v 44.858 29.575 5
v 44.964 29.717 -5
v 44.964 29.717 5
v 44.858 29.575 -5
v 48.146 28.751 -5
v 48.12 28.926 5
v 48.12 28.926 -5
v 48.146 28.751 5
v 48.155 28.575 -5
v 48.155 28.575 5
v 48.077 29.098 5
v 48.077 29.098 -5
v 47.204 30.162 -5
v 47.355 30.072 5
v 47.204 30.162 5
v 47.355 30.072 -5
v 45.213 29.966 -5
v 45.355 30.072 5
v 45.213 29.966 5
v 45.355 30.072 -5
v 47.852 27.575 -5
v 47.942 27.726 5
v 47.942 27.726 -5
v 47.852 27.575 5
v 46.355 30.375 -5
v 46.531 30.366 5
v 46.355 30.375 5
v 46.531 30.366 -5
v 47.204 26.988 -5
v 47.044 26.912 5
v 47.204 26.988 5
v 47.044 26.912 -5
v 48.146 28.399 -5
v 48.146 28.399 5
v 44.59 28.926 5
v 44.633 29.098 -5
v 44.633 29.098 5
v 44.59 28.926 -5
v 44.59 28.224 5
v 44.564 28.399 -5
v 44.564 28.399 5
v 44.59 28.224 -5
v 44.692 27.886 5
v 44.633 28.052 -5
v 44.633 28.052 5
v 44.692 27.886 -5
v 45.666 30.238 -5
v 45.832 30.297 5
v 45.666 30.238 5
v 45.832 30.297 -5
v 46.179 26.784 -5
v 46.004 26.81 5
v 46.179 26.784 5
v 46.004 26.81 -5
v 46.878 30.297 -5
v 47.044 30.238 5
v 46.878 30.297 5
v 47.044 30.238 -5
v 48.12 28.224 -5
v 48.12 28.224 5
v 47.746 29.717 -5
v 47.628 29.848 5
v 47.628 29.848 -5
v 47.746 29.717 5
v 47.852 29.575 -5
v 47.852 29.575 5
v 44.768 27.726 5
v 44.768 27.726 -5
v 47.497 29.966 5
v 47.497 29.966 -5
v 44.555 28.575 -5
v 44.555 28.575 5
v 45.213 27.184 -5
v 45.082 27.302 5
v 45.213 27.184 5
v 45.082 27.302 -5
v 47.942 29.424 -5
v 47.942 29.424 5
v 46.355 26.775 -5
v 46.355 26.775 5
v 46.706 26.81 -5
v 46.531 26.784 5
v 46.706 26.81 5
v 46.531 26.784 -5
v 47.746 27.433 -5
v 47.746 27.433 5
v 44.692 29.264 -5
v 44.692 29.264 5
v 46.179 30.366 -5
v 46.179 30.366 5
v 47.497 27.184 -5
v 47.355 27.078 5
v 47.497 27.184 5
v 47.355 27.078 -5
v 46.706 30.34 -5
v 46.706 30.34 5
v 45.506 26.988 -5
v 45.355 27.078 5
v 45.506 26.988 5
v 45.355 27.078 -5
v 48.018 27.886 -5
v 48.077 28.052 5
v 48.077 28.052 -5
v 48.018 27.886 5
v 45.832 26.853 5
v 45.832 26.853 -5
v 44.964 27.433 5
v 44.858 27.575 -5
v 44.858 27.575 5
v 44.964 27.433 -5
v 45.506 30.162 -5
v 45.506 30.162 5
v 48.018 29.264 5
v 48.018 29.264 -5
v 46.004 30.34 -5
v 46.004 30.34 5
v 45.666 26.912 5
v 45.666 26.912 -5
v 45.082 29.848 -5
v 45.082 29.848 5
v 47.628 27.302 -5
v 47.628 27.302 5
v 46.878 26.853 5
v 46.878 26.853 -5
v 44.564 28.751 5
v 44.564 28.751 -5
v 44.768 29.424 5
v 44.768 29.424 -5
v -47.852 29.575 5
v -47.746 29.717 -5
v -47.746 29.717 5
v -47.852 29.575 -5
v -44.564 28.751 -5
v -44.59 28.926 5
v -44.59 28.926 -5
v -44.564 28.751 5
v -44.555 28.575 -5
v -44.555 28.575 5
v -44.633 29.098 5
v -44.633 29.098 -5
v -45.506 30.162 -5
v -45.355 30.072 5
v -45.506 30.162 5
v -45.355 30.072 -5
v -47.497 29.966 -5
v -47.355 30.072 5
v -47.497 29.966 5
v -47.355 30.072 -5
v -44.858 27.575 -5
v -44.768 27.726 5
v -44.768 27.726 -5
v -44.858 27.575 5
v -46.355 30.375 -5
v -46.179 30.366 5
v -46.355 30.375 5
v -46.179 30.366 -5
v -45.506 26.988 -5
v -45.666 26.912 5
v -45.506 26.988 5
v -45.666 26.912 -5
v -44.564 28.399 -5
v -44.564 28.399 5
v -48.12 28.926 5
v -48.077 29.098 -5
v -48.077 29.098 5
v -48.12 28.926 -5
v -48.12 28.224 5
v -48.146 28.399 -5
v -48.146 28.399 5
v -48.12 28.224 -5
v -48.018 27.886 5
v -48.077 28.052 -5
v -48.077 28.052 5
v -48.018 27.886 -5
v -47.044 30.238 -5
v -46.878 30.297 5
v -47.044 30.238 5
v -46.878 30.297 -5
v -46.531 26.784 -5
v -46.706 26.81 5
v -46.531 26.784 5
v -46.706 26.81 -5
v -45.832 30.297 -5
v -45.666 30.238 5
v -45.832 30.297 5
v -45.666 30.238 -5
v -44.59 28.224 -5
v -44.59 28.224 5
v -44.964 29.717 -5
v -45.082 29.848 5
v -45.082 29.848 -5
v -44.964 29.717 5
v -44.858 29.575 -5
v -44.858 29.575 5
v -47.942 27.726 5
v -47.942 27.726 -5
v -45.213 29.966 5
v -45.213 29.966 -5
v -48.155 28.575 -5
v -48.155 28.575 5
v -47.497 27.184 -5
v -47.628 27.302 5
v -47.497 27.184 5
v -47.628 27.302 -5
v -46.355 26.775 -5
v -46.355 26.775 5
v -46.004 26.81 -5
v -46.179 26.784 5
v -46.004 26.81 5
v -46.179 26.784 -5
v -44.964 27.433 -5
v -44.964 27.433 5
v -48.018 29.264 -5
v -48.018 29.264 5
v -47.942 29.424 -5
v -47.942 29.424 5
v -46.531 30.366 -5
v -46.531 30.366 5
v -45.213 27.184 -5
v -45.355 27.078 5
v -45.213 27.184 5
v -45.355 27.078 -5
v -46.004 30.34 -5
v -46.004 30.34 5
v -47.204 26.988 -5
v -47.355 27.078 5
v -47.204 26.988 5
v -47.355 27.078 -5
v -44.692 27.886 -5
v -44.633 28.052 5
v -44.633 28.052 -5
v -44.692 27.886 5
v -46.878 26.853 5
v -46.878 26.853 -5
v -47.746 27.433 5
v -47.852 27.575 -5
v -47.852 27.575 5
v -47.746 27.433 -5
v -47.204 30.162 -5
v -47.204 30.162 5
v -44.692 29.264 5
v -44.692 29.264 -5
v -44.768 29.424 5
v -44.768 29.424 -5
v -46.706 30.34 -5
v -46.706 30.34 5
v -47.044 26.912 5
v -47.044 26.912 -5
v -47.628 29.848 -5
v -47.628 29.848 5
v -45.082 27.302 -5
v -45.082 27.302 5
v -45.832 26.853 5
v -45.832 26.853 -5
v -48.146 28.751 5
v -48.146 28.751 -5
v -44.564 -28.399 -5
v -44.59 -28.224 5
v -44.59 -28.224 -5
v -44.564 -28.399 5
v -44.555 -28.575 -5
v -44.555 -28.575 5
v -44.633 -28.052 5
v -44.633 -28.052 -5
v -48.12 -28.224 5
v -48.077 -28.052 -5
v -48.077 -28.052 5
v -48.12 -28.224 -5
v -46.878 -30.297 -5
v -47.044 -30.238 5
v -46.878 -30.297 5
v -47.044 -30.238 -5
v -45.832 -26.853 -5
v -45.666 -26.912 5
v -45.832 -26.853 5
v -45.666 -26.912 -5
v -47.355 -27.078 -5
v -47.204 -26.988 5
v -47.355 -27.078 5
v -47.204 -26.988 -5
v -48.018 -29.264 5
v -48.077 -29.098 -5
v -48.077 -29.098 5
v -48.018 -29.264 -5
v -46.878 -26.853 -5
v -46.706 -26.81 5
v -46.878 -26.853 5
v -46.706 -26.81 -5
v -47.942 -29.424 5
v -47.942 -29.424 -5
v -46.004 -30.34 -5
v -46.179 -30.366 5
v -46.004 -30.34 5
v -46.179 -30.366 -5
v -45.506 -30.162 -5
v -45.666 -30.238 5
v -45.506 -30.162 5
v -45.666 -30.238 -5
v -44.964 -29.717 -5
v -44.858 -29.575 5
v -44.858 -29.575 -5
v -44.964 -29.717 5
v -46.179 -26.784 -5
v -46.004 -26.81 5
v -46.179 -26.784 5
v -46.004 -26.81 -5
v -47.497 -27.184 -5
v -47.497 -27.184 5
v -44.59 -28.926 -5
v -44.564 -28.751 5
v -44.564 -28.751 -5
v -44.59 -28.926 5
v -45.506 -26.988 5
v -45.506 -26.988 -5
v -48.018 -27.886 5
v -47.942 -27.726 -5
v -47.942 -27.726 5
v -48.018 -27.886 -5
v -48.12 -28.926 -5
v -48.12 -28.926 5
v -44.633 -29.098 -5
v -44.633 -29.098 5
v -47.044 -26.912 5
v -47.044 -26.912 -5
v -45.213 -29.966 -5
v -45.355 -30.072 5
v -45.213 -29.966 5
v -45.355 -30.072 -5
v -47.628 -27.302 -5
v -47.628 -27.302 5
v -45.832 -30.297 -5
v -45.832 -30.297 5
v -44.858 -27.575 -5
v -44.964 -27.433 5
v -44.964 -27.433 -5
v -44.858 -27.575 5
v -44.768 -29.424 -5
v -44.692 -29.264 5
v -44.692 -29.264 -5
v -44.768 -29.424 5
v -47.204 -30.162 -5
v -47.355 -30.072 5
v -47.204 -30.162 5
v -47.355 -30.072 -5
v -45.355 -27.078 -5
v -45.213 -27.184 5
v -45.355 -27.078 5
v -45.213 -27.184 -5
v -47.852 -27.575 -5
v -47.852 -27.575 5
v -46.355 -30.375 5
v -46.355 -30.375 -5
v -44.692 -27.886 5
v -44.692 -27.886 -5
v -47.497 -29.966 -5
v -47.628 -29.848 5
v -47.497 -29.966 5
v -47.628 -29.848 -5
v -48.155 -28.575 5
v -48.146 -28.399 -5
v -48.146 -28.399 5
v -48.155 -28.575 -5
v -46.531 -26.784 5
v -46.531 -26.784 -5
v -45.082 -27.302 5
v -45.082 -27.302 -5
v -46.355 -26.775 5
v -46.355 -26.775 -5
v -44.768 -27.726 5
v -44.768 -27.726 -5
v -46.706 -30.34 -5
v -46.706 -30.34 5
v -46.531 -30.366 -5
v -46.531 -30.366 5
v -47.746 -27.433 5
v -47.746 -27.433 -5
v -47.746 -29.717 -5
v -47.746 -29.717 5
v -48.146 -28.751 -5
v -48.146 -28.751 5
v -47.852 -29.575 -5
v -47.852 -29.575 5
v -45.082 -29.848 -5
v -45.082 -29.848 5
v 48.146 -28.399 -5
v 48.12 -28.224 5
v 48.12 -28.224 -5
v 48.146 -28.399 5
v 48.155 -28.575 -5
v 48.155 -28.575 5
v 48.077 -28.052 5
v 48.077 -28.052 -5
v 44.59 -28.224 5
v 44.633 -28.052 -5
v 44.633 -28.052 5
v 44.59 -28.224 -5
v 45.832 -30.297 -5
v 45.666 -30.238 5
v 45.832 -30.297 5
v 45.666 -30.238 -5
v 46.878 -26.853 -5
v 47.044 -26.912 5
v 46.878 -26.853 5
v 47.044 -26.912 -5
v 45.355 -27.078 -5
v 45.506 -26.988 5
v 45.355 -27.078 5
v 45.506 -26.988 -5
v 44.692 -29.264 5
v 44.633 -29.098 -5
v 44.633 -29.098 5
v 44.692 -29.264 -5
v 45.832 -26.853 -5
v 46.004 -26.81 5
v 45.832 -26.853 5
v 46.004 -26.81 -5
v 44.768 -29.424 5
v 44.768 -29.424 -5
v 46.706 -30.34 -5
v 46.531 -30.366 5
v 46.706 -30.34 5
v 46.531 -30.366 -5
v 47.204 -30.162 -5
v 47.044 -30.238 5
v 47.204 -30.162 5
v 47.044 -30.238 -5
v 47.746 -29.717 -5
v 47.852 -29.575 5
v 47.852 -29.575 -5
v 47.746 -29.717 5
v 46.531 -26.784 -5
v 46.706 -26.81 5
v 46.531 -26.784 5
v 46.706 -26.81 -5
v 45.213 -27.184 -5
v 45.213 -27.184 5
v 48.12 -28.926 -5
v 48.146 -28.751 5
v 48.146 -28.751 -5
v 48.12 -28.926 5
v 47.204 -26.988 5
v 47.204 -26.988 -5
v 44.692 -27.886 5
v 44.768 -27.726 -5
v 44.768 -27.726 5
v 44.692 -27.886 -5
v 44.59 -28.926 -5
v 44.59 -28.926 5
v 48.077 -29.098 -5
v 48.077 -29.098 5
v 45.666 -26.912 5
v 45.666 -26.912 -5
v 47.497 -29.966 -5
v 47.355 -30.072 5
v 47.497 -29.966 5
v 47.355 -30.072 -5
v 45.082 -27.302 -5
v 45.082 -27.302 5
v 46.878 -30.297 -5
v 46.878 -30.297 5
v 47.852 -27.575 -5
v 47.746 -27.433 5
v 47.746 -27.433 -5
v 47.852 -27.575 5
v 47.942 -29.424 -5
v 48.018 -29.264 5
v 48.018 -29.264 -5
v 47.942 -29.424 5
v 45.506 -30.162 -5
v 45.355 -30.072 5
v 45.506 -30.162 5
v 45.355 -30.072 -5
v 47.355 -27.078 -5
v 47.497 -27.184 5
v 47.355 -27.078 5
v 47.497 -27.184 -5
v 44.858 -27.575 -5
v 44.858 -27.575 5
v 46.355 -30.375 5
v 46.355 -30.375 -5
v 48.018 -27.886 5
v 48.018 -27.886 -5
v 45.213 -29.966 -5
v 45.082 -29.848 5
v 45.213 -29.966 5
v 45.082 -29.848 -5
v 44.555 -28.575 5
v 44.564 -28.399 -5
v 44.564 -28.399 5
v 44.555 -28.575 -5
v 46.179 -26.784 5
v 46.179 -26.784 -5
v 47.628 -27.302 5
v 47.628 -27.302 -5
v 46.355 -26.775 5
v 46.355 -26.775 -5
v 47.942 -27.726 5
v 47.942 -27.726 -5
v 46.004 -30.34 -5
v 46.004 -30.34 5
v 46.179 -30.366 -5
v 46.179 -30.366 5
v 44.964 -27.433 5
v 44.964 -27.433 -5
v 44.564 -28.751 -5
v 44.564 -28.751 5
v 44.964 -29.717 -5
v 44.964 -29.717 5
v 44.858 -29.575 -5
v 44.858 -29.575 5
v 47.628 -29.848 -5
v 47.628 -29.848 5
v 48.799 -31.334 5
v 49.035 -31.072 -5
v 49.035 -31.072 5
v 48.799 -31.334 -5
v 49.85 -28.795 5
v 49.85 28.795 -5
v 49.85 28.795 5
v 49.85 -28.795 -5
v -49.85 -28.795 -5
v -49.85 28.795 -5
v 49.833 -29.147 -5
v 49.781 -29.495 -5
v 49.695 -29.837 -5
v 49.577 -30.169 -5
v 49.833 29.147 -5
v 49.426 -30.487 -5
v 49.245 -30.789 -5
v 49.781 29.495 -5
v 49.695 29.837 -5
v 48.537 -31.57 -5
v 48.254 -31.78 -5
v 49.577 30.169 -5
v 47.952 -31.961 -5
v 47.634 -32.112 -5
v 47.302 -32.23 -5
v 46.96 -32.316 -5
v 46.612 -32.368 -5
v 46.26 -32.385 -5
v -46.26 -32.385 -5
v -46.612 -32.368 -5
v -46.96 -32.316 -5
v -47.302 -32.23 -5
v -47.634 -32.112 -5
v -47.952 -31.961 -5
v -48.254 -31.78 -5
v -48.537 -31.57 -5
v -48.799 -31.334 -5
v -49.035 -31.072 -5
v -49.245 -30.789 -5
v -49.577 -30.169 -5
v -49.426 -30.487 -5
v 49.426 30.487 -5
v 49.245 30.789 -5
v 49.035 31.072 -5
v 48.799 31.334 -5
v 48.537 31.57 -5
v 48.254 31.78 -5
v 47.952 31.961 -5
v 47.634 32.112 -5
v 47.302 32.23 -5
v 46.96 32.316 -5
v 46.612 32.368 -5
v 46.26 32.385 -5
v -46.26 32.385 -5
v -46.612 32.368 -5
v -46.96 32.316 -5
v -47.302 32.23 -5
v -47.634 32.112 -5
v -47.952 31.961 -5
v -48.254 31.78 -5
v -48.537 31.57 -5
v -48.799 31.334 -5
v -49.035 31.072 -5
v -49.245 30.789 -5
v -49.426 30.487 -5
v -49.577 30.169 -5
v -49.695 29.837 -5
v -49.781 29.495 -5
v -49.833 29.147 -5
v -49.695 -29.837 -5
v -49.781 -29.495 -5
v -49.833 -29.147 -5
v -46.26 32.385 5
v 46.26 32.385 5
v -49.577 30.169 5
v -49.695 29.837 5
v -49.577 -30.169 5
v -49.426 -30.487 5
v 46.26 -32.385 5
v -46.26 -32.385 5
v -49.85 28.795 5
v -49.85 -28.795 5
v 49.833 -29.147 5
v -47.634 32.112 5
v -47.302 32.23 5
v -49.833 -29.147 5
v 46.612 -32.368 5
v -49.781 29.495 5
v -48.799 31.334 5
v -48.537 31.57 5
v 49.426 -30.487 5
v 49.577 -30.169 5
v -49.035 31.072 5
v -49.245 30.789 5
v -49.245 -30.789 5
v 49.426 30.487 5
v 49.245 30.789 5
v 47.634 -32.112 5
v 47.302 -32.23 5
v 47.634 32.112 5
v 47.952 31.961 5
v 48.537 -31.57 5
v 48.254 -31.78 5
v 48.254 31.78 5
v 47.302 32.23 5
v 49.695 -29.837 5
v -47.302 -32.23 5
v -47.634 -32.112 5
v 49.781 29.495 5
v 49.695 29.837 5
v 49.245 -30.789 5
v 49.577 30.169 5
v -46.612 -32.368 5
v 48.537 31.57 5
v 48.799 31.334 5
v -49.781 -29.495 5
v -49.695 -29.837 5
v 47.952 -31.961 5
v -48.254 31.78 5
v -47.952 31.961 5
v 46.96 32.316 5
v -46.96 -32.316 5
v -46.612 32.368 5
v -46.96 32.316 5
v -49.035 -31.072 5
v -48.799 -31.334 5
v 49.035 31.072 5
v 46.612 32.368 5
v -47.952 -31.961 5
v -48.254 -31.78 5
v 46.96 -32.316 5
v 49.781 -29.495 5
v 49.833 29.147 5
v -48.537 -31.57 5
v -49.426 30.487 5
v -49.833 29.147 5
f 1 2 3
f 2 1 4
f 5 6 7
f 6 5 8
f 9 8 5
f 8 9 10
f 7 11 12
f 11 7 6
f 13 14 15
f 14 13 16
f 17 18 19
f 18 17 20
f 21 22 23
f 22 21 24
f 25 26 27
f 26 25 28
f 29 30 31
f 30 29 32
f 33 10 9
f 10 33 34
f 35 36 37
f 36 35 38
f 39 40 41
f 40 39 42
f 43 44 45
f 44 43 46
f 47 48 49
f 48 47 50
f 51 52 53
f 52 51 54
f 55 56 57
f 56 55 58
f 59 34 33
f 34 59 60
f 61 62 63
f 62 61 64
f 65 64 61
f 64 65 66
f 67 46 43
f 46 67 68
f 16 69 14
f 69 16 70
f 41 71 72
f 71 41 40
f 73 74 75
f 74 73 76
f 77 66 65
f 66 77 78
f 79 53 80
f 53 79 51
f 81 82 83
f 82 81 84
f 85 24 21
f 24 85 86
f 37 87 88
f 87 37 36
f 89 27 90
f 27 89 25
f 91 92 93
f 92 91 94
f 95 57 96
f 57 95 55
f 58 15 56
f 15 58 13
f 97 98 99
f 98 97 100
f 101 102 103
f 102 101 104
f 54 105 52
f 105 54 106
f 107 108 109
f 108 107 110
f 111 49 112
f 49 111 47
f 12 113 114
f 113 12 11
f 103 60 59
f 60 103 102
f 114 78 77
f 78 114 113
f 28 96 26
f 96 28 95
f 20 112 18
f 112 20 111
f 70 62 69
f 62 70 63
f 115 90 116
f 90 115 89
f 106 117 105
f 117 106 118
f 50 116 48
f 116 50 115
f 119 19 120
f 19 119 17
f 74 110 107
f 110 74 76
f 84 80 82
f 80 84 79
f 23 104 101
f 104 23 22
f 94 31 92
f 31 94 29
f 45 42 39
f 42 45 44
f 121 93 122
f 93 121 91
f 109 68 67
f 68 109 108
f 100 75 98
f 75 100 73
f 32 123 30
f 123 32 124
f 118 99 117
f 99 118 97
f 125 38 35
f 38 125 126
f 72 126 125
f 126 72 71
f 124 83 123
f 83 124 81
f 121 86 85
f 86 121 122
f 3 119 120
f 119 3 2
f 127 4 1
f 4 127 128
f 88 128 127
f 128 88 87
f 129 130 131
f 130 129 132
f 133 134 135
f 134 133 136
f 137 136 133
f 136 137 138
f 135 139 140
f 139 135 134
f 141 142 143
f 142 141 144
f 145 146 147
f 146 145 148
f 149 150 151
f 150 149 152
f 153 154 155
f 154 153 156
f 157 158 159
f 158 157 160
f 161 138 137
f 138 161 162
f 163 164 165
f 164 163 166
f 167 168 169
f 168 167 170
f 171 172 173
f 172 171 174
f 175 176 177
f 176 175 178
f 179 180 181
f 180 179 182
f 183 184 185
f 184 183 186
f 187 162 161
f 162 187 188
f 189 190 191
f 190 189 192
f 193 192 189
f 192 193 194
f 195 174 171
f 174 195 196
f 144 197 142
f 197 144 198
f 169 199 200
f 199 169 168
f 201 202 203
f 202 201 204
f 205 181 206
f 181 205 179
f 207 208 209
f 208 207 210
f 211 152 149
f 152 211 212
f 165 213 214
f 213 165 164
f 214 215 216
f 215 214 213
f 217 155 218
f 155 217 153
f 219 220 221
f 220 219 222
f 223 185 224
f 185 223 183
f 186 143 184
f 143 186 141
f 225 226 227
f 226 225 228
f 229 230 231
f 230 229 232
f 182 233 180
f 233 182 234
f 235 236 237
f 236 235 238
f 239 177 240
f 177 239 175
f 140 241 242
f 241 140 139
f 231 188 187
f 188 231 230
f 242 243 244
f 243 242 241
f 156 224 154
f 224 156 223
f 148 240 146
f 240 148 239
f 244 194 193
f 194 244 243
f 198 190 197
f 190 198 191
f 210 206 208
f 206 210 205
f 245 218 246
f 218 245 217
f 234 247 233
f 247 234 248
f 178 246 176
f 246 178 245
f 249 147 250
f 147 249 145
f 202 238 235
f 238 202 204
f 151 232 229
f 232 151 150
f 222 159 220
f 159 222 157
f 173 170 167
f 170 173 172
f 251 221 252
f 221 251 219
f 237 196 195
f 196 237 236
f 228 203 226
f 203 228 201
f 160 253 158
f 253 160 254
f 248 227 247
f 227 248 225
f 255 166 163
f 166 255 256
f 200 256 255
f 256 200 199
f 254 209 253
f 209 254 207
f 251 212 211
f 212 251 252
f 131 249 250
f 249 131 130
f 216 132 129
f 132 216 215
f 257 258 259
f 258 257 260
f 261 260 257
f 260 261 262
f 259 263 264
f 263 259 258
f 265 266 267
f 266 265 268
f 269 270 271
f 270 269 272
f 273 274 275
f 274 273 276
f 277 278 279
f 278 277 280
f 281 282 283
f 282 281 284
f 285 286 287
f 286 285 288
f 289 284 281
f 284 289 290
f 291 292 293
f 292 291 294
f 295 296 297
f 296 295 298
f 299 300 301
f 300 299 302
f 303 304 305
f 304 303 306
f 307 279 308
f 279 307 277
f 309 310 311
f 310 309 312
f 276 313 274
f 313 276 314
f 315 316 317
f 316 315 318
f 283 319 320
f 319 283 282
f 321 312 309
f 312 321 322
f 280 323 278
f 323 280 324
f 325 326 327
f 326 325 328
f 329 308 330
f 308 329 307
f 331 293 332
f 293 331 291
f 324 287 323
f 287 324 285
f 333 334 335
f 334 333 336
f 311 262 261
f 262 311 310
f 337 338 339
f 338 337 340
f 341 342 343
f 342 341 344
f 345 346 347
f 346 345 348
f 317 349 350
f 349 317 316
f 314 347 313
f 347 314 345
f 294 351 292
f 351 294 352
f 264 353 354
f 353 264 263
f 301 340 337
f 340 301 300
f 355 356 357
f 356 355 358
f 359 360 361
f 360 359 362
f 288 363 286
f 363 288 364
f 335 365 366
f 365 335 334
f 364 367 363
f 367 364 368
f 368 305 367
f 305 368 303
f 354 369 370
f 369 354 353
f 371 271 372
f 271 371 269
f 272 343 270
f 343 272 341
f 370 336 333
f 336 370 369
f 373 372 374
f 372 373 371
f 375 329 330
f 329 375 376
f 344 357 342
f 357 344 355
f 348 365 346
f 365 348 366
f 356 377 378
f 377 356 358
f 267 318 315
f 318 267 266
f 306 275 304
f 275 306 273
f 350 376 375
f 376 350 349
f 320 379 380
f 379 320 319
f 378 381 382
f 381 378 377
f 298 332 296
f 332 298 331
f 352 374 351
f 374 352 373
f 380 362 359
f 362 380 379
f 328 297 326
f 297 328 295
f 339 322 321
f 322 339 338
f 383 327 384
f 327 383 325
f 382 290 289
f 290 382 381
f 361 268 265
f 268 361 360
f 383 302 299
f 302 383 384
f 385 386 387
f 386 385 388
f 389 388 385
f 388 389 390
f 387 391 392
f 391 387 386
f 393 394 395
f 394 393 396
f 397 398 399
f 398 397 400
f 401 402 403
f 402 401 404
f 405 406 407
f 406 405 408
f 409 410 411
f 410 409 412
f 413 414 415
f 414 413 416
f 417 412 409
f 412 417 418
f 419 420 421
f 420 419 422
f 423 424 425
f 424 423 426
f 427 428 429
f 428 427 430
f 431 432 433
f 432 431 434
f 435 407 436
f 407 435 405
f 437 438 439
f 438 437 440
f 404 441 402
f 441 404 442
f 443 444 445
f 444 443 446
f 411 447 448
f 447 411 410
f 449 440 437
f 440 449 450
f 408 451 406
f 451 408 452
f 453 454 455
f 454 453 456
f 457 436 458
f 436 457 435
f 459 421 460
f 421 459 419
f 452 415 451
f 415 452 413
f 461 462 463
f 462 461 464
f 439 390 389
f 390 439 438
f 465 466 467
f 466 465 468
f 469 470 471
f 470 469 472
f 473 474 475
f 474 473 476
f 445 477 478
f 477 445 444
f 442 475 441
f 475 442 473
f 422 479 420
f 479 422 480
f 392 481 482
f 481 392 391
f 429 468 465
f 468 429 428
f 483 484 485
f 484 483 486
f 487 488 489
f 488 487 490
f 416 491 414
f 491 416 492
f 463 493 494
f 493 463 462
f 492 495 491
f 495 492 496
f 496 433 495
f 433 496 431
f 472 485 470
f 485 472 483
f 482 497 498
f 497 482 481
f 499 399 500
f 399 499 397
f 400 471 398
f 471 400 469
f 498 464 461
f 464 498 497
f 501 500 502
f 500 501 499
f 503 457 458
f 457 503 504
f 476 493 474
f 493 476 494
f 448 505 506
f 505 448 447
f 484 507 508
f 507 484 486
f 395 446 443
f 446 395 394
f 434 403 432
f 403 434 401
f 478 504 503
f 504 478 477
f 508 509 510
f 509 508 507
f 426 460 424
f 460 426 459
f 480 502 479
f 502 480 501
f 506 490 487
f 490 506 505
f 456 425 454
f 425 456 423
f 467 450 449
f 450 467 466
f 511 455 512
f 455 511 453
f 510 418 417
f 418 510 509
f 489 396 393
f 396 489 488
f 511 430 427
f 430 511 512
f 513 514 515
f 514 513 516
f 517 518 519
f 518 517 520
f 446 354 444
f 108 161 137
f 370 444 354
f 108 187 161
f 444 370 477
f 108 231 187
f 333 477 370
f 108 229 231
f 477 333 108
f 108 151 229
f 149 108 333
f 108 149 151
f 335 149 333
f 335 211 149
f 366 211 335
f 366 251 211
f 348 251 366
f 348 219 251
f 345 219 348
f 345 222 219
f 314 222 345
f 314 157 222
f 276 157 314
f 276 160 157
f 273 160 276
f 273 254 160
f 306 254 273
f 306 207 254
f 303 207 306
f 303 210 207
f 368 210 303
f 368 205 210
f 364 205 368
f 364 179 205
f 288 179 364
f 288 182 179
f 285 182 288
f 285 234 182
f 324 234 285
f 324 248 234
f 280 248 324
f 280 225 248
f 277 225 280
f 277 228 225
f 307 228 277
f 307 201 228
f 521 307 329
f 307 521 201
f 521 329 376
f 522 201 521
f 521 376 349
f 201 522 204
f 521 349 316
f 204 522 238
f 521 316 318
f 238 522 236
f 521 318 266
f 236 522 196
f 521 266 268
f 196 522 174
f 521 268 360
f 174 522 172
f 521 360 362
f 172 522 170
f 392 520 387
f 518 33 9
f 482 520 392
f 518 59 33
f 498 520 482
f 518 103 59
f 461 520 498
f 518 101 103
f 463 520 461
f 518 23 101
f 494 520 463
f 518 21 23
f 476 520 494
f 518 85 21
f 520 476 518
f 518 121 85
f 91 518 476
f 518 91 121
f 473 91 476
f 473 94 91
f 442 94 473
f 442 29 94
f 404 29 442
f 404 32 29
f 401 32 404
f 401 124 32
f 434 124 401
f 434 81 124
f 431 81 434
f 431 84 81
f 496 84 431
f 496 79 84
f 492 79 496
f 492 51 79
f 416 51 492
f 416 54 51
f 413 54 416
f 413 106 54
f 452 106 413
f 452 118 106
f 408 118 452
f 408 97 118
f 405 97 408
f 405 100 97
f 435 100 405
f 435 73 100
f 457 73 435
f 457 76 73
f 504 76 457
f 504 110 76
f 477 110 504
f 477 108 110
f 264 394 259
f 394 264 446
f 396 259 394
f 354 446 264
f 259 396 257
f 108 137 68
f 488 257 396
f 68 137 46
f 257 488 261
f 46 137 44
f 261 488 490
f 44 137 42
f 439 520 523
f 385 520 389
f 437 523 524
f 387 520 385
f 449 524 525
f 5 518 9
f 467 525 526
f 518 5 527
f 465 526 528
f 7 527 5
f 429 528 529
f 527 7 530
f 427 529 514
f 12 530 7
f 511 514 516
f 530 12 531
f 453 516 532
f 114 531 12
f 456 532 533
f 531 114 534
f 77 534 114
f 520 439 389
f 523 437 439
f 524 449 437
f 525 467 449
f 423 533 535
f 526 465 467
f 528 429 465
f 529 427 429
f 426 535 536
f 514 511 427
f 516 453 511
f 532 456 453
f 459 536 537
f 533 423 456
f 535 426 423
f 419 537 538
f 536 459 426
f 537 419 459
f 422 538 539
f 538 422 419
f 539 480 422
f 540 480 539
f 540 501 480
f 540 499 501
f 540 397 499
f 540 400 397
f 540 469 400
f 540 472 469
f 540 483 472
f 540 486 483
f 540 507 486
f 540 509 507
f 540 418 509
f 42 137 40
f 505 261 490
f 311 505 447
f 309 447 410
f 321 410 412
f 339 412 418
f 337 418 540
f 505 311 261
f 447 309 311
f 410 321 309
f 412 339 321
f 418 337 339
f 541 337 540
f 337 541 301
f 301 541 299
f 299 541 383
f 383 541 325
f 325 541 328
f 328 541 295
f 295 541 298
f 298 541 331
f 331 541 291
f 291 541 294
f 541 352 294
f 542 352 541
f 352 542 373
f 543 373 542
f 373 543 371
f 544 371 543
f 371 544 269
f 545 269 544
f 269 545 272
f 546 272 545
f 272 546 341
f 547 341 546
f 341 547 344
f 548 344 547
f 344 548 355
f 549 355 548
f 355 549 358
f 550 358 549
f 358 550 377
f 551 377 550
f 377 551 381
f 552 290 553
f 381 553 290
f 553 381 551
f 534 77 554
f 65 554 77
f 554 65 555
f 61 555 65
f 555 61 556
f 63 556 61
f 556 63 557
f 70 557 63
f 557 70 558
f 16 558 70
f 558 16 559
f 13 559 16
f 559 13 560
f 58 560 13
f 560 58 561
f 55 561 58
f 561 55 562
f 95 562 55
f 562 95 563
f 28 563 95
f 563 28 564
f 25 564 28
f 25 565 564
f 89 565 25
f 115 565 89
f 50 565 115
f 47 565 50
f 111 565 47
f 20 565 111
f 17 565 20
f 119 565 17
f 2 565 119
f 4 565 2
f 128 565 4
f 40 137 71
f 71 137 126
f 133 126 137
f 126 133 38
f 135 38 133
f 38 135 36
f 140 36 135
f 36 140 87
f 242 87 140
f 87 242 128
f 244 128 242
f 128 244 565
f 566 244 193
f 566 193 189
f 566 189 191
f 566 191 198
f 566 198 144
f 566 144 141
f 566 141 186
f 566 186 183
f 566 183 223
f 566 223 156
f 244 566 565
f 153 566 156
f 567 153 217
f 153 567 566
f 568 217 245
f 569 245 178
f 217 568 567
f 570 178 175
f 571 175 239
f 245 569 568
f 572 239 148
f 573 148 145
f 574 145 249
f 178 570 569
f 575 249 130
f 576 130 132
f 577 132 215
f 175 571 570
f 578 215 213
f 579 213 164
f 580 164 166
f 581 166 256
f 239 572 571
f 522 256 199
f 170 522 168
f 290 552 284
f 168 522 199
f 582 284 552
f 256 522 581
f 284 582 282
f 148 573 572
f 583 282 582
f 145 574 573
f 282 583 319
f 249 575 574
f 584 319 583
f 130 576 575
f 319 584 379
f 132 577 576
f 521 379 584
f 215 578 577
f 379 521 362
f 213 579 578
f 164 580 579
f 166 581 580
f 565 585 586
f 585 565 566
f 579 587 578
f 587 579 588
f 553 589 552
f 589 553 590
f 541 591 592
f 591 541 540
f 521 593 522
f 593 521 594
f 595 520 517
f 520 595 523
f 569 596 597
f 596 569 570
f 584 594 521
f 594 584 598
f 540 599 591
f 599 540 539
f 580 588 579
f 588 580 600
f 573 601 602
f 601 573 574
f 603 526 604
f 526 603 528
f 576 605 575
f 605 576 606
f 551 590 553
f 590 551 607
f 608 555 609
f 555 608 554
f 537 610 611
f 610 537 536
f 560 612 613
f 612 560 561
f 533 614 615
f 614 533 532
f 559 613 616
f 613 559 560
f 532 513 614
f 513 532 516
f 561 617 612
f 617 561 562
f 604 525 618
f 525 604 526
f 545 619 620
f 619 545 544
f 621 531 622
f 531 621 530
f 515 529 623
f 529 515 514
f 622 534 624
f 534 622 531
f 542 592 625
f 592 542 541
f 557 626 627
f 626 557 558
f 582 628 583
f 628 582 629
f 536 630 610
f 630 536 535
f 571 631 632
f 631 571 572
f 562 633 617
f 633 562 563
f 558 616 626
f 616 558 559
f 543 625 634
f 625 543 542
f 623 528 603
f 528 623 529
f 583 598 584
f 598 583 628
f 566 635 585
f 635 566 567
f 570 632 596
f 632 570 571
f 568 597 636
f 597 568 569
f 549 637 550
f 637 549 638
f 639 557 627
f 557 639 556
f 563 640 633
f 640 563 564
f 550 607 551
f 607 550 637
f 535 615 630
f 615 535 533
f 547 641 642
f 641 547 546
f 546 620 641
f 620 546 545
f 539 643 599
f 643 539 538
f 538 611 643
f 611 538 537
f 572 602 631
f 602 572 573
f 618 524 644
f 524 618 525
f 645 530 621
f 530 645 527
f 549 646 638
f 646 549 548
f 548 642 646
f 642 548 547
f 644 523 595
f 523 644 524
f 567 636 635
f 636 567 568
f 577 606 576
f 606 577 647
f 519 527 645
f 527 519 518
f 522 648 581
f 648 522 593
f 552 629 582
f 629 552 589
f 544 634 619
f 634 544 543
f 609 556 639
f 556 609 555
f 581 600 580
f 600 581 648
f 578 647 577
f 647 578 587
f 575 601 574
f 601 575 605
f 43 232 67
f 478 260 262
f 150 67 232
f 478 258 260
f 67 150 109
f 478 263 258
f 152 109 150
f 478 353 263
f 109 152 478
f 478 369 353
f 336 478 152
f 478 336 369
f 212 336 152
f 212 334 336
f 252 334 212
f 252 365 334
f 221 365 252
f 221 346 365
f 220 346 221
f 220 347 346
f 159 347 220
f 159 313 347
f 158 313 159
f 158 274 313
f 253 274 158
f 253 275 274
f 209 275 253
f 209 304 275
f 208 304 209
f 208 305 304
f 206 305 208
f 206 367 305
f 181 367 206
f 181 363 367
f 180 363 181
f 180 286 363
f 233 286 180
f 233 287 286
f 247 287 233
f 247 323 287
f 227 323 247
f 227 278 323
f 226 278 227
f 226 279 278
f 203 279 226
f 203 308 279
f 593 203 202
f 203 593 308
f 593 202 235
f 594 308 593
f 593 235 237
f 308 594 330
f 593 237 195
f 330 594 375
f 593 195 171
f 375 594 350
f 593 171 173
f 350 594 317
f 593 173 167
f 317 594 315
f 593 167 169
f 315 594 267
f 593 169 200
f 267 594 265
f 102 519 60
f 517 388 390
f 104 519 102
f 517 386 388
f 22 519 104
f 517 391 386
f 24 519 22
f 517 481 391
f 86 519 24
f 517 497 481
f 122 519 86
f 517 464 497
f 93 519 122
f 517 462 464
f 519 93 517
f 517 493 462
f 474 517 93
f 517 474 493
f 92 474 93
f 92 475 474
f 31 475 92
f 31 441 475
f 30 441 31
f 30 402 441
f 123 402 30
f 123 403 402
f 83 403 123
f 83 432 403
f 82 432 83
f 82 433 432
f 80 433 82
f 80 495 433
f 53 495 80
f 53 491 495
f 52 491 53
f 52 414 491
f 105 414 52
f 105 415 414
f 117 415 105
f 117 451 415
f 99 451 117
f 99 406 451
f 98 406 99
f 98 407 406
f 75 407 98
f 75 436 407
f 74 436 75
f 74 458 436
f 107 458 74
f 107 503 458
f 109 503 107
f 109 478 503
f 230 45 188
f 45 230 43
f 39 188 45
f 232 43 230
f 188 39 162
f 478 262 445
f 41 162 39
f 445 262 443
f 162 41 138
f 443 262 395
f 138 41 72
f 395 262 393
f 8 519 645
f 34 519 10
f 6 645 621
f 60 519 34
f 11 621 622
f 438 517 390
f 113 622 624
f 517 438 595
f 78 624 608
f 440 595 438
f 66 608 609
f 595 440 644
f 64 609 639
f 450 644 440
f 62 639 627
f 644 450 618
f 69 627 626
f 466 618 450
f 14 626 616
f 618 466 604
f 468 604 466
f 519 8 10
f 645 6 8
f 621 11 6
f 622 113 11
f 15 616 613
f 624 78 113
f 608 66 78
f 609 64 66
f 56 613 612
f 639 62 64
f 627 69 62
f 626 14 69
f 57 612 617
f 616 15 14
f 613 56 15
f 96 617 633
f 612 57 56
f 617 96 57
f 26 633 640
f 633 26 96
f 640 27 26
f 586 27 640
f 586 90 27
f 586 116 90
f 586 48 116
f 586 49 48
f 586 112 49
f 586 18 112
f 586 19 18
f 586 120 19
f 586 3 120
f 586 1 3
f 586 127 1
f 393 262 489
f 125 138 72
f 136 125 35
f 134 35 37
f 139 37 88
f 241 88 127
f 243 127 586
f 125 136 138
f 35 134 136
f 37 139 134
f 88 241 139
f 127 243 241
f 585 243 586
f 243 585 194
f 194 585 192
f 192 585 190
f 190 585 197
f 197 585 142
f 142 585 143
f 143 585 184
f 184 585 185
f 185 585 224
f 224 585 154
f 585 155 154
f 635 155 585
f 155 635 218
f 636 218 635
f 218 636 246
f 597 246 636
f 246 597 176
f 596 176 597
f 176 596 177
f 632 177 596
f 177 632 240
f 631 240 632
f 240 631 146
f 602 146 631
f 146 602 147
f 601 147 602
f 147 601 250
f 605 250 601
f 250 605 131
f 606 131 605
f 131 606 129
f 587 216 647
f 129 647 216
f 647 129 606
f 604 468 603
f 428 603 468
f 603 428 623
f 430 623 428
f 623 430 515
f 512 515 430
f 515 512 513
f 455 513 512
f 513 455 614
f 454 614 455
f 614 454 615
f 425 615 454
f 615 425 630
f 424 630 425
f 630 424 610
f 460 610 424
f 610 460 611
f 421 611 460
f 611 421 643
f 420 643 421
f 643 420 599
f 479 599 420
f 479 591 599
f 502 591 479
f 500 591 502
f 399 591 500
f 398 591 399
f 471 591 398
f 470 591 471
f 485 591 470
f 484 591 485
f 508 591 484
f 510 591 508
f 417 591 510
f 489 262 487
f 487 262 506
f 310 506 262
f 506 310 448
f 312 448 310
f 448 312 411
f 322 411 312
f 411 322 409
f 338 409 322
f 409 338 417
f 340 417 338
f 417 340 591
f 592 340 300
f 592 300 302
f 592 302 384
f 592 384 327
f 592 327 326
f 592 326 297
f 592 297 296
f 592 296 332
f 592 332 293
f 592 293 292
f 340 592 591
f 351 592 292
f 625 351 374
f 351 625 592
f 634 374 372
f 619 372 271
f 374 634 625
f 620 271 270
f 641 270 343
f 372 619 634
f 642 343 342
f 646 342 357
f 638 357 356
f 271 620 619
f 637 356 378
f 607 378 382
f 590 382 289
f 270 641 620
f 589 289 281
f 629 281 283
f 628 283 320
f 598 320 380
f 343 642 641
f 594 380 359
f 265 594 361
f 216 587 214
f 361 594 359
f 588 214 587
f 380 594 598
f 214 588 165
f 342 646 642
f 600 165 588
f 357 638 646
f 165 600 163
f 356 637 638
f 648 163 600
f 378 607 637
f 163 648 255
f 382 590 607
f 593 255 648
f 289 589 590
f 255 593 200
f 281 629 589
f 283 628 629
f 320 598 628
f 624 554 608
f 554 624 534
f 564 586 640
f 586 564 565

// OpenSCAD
/*********************************
Measurements taken from 
http://www.reprap.org/wiki/SAV_MKI
*********************************/

//board data
lenght = 99.7;
width = 64.77;
height = 10;
colorBoard = "limegreen";
roundCornersRadio = 3.59;
//mounting holes data
mountingHoleRadio = 1.8;
mountingHolesL = 92.71;
mountingHolesW = 64.77;
mountingDistanceFromBoard = 3.81;

$fn = 64;//3D printing definition

/********************************/
module boardArea(){
	cx = lenght/2 - roundCornersRadio;
	cy = width/2 - roundCornersRadio;
	boardPoints = [
		[cx,cy,0],
	 	[-cx,cy,0],
		[-cx,-cy,0],
		[cx,-cy,0]
	];
	hull(){
		for(x = boardPoints)
			translate(x)
				cylinder(r= roundCornersRadio, h = height, center = true);	
	}
}	
module mountingHolesAll(){
	tx = mountingHolesL/2;
	ty = mountingHolesW/2 - mountingDistanceFromBoard;
	PointsMountingHoles = [
		[tx,ty,0],
		[-tx,ty,0],
		[-tx,-ty,0],
		[tx,-ty,0],
		];
	for(y = PointsMountingHoles)
	translate(y)
		cylinder(r= mountingHoleRadio, h = height+1, center = true);
}
module SAV_MKI_print(){
	color(colorBoard)
	difference(){
		boardArea();
		mountingHolesAll();
	}
}
SAV_MKI_print();
